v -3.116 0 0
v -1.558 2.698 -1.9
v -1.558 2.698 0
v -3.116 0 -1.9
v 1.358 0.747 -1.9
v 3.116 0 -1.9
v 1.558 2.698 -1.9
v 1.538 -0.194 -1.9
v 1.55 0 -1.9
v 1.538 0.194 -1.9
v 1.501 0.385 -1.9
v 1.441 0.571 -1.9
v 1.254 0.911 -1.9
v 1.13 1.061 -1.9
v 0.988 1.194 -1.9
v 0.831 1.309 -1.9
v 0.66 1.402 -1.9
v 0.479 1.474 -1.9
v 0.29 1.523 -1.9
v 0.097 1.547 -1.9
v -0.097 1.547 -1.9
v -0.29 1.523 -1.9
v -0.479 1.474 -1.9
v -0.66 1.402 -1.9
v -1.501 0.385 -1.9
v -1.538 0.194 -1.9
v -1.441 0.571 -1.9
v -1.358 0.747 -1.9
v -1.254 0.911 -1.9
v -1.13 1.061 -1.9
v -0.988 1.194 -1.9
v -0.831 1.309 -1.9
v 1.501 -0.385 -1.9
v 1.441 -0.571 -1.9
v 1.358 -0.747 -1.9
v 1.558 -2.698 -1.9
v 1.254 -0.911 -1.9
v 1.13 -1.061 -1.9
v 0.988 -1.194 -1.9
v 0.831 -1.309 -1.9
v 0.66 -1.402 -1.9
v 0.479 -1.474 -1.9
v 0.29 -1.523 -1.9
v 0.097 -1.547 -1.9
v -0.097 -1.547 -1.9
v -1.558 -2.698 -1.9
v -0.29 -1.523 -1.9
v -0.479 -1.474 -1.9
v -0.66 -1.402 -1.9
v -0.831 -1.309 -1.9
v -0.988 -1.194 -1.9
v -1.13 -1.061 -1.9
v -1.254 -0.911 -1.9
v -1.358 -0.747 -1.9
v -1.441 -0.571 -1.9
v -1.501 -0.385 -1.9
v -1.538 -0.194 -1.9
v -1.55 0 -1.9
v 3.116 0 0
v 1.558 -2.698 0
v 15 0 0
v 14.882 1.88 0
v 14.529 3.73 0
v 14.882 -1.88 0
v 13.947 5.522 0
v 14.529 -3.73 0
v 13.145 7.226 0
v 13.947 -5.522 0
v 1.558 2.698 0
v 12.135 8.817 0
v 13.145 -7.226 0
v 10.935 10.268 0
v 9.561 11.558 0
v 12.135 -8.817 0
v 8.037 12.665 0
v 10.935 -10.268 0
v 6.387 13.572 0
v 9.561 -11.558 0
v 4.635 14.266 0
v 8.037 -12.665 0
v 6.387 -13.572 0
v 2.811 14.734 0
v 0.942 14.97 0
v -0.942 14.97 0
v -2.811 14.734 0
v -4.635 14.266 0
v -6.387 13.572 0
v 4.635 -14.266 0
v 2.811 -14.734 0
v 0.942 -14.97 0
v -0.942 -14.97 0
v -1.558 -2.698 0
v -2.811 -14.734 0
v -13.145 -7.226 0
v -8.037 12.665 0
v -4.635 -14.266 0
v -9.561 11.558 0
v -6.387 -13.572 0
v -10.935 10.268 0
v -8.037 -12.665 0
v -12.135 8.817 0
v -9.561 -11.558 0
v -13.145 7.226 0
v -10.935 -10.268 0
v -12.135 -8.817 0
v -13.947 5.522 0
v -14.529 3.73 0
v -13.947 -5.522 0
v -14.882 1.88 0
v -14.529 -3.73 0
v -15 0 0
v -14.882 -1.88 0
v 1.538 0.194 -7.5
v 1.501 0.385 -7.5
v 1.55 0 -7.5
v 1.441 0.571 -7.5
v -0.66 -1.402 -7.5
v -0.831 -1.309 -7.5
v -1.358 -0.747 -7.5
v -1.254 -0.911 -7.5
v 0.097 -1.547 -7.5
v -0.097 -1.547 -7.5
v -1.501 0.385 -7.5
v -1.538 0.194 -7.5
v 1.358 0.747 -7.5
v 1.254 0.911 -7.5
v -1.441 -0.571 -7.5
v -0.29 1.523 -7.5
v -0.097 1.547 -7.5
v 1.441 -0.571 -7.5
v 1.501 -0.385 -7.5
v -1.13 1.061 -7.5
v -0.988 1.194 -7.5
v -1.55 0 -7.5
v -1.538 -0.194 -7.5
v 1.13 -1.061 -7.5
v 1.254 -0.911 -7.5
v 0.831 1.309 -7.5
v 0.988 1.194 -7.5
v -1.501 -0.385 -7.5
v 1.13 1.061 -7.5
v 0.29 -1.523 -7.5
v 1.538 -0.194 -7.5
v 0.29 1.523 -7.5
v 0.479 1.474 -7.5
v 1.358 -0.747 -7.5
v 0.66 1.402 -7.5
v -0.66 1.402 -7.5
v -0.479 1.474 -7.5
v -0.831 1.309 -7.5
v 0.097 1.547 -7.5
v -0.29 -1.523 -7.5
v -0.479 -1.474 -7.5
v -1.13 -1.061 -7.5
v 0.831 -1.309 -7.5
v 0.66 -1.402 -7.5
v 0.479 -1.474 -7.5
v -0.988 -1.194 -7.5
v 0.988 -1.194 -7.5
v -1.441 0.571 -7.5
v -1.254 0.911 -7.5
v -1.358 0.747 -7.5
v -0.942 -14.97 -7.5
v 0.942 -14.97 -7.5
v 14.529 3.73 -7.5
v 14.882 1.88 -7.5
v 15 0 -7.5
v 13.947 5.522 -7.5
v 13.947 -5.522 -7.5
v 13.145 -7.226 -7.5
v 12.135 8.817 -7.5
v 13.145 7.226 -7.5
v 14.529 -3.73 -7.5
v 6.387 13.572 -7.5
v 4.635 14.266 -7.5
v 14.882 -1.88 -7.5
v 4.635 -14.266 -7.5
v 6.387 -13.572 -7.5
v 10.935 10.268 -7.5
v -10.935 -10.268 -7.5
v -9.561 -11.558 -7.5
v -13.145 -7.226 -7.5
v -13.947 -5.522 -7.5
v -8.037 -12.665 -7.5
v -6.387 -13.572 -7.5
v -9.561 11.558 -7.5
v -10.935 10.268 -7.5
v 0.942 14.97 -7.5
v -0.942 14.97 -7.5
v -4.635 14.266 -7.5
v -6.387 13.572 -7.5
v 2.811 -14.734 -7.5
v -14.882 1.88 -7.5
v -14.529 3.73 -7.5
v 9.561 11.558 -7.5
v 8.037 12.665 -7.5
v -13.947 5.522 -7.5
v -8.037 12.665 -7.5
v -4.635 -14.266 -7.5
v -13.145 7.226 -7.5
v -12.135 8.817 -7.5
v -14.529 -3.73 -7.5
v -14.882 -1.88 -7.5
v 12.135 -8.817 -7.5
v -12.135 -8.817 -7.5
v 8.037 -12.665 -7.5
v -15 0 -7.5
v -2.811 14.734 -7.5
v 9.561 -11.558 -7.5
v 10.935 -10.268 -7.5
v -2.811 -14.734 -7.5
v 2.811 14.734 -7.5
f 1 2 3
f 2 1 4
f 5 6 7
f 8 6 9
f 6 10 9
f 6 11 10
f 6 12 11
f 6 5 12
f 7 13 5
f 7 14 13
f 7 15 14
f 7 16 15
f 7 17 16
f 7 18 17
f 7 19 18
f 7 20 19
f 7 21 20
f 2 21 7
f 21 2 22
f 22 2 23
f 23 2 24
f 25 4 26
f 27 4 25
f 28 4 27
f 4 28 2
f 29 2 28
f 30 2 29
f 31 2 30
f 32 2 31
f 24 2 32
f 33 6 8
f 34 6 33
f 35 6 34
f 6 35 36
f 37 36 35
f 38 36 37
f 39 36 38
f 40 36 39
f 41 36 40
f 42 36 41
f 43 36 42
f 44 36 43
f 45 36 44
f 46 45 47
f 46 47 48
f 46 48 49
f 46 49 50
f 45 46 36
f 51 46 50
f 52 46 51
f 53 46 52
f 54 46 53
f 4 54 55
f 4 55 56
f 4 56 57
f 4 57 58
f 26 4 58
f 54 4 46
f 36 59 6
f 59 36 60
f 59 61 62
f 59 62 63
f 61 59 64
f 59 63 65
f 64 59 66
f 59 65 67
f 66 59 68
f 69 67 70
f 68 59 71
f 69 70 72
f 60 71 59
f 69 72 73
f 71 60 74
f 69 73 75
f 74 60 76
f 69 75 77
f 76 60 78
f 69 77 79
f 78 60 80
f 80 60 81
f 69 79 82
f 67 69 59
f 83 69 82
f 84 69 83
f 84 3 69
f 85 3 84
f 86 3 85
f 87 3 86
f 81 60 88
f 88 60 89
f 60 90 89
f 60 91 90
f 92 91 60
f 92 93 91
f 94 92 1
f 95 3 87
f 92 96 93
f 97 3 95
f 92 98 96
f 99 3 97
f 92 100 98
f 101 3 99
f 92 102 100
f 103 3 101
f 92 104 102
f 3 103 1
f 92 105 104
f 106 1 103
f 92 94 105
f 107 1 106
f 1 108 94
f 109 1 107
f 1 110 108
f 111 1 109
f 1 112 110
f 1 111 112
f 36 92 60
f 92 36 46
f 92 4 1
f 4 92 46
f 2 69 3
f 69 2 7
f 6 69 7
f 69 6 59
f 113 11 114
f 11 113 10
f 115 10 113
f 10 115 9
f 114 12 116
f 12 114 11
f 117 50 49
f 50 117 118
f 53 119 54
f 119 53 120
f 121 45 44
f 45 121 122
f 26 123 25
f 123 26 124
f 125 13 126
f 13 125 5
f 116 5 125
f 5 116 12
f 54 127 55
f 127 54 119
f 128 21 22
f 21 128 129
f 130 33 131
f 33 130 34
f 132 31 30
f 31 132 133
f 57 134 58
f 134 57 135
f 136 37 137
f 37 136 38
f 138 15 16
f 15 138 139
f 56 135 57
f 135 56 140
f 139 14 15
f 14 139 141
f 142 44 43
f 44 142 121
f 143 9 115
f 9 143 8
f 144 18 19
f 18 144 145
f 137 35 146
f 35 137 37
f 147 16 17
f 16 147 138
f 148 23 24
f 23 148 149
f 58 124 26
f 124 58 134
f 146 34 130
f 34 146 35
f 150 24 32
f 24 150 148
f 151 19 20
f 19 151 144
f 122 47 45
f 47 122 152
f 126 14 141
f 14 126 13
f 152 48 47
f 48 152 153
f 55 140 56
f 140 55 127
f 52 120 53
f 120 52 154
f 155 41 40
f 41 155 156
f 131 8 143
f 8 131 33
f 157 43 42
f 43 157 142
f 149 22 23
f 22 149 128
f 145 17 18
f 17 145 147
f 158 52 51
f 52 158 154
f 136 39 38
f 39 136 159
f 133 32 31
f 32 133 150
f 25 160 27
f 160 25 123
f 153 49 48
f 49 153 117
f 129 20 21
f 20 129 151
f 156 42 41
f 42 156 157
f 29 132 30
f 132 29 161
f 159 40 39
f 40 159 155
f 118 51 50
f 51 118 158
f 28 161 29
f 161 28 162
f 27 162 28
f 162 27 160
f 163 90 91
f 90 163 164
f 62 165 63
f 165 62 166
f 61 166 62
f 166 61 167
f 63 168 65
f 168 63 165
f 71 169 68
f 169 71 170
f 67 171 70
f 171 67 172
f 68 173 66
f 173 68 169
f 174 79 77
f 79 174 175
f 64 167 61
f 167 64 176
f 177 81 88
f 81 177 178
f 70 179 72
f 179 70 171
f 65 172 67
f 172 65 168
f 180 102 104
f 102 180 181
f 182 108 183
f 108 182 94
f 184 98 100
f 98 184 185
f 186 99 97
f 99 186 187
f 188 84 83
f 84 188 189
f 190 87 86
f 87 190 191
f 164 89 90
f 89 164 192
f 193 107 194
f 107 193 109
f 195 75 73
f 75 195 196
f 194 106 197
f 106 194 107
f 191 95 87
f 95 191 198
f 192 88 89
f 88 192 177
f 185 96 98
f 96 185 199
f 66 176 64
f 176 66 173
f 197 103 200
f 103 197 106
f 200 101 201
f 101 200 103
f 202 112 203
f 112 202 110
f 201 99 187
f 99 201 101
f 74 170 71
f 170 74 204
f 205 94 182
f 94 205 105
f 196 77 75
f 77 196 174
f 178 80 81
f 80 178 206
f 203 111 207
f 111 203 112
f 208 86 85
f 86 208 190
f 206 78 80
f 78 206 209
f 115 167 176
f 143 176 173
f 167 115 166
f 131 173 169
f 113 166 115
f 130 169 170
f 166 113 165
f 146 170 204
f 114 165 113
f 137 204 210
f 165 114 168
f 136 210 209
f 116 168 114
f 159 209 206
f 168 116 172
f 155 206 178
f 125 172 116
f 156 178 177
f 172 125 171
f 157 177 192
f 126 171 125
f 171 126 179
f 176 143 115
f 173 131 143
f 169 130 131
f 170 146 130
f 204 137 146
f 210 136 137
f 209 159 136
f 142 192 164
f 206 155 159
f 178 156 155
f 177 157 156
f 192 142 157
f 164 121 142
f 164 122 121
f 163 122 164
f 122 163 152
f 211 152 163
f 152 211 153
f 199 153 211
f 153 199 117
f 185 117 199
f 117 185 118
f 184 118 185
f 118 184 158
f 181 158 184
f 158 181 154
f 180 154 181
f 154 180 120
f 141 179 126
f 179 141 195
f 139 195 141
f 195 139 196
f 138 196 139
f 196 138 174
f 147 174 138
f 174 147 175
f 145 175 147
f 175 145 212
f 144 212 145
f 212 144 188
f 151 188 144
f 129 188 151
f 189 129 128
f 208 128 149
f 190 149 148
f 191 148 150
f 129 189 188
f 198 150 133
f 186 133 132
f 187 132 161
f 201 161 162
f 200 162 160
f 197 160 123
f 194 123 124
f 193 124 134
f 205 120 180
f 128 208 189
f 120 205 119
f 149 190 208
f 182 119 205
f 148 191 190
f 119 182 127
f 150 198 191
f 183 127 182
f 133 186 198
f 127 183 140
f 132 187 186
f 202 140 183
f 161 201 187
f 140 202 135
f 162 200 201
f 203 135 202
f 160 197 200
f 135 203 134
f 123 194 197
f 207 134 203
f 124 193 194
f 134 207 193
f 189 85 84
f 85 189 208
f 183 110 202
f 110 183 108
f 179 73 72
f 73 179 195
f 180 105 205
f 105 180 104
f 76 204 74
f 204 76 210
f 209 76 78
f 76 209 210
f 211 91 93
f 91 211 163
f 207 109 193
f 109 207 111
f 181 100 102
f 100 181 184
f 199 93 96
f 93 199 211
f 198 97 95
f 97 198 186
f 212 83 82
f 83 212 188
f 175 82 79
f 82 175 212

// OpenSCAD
$fn = 50;

difference() {
	union() {
		translate(v = [0, 0, -7.5]) {
			cylinder(h = 7.5, r = 15.0);
		}
	}
	union() {
		translate(v = [0, 0, 0]) {
			rotate(a = [0, 0, 0]) {
				difference() {
					union() {
						translate(v = [0, 0, -1.9]) {
							linear_extrude(height = 1.9) {
								polygon(points = [[3.1158, 0.0], [1.5579000000000005, 2.698361953111554], [-1.5578999999999994, 2.6983619531115544], [-3.1158, 3.815754496783323e-16], [-1.5579000000000014, -2.6983619531115535], [1.557899999999998, -2.6983619531115552]]);
							}
						}
					}
					union();
				}
			}
		}
		#translate(v = [0, 0, -100.0]) {
			cylinder(h = 200, r = 1.55);
		}
	}
}
